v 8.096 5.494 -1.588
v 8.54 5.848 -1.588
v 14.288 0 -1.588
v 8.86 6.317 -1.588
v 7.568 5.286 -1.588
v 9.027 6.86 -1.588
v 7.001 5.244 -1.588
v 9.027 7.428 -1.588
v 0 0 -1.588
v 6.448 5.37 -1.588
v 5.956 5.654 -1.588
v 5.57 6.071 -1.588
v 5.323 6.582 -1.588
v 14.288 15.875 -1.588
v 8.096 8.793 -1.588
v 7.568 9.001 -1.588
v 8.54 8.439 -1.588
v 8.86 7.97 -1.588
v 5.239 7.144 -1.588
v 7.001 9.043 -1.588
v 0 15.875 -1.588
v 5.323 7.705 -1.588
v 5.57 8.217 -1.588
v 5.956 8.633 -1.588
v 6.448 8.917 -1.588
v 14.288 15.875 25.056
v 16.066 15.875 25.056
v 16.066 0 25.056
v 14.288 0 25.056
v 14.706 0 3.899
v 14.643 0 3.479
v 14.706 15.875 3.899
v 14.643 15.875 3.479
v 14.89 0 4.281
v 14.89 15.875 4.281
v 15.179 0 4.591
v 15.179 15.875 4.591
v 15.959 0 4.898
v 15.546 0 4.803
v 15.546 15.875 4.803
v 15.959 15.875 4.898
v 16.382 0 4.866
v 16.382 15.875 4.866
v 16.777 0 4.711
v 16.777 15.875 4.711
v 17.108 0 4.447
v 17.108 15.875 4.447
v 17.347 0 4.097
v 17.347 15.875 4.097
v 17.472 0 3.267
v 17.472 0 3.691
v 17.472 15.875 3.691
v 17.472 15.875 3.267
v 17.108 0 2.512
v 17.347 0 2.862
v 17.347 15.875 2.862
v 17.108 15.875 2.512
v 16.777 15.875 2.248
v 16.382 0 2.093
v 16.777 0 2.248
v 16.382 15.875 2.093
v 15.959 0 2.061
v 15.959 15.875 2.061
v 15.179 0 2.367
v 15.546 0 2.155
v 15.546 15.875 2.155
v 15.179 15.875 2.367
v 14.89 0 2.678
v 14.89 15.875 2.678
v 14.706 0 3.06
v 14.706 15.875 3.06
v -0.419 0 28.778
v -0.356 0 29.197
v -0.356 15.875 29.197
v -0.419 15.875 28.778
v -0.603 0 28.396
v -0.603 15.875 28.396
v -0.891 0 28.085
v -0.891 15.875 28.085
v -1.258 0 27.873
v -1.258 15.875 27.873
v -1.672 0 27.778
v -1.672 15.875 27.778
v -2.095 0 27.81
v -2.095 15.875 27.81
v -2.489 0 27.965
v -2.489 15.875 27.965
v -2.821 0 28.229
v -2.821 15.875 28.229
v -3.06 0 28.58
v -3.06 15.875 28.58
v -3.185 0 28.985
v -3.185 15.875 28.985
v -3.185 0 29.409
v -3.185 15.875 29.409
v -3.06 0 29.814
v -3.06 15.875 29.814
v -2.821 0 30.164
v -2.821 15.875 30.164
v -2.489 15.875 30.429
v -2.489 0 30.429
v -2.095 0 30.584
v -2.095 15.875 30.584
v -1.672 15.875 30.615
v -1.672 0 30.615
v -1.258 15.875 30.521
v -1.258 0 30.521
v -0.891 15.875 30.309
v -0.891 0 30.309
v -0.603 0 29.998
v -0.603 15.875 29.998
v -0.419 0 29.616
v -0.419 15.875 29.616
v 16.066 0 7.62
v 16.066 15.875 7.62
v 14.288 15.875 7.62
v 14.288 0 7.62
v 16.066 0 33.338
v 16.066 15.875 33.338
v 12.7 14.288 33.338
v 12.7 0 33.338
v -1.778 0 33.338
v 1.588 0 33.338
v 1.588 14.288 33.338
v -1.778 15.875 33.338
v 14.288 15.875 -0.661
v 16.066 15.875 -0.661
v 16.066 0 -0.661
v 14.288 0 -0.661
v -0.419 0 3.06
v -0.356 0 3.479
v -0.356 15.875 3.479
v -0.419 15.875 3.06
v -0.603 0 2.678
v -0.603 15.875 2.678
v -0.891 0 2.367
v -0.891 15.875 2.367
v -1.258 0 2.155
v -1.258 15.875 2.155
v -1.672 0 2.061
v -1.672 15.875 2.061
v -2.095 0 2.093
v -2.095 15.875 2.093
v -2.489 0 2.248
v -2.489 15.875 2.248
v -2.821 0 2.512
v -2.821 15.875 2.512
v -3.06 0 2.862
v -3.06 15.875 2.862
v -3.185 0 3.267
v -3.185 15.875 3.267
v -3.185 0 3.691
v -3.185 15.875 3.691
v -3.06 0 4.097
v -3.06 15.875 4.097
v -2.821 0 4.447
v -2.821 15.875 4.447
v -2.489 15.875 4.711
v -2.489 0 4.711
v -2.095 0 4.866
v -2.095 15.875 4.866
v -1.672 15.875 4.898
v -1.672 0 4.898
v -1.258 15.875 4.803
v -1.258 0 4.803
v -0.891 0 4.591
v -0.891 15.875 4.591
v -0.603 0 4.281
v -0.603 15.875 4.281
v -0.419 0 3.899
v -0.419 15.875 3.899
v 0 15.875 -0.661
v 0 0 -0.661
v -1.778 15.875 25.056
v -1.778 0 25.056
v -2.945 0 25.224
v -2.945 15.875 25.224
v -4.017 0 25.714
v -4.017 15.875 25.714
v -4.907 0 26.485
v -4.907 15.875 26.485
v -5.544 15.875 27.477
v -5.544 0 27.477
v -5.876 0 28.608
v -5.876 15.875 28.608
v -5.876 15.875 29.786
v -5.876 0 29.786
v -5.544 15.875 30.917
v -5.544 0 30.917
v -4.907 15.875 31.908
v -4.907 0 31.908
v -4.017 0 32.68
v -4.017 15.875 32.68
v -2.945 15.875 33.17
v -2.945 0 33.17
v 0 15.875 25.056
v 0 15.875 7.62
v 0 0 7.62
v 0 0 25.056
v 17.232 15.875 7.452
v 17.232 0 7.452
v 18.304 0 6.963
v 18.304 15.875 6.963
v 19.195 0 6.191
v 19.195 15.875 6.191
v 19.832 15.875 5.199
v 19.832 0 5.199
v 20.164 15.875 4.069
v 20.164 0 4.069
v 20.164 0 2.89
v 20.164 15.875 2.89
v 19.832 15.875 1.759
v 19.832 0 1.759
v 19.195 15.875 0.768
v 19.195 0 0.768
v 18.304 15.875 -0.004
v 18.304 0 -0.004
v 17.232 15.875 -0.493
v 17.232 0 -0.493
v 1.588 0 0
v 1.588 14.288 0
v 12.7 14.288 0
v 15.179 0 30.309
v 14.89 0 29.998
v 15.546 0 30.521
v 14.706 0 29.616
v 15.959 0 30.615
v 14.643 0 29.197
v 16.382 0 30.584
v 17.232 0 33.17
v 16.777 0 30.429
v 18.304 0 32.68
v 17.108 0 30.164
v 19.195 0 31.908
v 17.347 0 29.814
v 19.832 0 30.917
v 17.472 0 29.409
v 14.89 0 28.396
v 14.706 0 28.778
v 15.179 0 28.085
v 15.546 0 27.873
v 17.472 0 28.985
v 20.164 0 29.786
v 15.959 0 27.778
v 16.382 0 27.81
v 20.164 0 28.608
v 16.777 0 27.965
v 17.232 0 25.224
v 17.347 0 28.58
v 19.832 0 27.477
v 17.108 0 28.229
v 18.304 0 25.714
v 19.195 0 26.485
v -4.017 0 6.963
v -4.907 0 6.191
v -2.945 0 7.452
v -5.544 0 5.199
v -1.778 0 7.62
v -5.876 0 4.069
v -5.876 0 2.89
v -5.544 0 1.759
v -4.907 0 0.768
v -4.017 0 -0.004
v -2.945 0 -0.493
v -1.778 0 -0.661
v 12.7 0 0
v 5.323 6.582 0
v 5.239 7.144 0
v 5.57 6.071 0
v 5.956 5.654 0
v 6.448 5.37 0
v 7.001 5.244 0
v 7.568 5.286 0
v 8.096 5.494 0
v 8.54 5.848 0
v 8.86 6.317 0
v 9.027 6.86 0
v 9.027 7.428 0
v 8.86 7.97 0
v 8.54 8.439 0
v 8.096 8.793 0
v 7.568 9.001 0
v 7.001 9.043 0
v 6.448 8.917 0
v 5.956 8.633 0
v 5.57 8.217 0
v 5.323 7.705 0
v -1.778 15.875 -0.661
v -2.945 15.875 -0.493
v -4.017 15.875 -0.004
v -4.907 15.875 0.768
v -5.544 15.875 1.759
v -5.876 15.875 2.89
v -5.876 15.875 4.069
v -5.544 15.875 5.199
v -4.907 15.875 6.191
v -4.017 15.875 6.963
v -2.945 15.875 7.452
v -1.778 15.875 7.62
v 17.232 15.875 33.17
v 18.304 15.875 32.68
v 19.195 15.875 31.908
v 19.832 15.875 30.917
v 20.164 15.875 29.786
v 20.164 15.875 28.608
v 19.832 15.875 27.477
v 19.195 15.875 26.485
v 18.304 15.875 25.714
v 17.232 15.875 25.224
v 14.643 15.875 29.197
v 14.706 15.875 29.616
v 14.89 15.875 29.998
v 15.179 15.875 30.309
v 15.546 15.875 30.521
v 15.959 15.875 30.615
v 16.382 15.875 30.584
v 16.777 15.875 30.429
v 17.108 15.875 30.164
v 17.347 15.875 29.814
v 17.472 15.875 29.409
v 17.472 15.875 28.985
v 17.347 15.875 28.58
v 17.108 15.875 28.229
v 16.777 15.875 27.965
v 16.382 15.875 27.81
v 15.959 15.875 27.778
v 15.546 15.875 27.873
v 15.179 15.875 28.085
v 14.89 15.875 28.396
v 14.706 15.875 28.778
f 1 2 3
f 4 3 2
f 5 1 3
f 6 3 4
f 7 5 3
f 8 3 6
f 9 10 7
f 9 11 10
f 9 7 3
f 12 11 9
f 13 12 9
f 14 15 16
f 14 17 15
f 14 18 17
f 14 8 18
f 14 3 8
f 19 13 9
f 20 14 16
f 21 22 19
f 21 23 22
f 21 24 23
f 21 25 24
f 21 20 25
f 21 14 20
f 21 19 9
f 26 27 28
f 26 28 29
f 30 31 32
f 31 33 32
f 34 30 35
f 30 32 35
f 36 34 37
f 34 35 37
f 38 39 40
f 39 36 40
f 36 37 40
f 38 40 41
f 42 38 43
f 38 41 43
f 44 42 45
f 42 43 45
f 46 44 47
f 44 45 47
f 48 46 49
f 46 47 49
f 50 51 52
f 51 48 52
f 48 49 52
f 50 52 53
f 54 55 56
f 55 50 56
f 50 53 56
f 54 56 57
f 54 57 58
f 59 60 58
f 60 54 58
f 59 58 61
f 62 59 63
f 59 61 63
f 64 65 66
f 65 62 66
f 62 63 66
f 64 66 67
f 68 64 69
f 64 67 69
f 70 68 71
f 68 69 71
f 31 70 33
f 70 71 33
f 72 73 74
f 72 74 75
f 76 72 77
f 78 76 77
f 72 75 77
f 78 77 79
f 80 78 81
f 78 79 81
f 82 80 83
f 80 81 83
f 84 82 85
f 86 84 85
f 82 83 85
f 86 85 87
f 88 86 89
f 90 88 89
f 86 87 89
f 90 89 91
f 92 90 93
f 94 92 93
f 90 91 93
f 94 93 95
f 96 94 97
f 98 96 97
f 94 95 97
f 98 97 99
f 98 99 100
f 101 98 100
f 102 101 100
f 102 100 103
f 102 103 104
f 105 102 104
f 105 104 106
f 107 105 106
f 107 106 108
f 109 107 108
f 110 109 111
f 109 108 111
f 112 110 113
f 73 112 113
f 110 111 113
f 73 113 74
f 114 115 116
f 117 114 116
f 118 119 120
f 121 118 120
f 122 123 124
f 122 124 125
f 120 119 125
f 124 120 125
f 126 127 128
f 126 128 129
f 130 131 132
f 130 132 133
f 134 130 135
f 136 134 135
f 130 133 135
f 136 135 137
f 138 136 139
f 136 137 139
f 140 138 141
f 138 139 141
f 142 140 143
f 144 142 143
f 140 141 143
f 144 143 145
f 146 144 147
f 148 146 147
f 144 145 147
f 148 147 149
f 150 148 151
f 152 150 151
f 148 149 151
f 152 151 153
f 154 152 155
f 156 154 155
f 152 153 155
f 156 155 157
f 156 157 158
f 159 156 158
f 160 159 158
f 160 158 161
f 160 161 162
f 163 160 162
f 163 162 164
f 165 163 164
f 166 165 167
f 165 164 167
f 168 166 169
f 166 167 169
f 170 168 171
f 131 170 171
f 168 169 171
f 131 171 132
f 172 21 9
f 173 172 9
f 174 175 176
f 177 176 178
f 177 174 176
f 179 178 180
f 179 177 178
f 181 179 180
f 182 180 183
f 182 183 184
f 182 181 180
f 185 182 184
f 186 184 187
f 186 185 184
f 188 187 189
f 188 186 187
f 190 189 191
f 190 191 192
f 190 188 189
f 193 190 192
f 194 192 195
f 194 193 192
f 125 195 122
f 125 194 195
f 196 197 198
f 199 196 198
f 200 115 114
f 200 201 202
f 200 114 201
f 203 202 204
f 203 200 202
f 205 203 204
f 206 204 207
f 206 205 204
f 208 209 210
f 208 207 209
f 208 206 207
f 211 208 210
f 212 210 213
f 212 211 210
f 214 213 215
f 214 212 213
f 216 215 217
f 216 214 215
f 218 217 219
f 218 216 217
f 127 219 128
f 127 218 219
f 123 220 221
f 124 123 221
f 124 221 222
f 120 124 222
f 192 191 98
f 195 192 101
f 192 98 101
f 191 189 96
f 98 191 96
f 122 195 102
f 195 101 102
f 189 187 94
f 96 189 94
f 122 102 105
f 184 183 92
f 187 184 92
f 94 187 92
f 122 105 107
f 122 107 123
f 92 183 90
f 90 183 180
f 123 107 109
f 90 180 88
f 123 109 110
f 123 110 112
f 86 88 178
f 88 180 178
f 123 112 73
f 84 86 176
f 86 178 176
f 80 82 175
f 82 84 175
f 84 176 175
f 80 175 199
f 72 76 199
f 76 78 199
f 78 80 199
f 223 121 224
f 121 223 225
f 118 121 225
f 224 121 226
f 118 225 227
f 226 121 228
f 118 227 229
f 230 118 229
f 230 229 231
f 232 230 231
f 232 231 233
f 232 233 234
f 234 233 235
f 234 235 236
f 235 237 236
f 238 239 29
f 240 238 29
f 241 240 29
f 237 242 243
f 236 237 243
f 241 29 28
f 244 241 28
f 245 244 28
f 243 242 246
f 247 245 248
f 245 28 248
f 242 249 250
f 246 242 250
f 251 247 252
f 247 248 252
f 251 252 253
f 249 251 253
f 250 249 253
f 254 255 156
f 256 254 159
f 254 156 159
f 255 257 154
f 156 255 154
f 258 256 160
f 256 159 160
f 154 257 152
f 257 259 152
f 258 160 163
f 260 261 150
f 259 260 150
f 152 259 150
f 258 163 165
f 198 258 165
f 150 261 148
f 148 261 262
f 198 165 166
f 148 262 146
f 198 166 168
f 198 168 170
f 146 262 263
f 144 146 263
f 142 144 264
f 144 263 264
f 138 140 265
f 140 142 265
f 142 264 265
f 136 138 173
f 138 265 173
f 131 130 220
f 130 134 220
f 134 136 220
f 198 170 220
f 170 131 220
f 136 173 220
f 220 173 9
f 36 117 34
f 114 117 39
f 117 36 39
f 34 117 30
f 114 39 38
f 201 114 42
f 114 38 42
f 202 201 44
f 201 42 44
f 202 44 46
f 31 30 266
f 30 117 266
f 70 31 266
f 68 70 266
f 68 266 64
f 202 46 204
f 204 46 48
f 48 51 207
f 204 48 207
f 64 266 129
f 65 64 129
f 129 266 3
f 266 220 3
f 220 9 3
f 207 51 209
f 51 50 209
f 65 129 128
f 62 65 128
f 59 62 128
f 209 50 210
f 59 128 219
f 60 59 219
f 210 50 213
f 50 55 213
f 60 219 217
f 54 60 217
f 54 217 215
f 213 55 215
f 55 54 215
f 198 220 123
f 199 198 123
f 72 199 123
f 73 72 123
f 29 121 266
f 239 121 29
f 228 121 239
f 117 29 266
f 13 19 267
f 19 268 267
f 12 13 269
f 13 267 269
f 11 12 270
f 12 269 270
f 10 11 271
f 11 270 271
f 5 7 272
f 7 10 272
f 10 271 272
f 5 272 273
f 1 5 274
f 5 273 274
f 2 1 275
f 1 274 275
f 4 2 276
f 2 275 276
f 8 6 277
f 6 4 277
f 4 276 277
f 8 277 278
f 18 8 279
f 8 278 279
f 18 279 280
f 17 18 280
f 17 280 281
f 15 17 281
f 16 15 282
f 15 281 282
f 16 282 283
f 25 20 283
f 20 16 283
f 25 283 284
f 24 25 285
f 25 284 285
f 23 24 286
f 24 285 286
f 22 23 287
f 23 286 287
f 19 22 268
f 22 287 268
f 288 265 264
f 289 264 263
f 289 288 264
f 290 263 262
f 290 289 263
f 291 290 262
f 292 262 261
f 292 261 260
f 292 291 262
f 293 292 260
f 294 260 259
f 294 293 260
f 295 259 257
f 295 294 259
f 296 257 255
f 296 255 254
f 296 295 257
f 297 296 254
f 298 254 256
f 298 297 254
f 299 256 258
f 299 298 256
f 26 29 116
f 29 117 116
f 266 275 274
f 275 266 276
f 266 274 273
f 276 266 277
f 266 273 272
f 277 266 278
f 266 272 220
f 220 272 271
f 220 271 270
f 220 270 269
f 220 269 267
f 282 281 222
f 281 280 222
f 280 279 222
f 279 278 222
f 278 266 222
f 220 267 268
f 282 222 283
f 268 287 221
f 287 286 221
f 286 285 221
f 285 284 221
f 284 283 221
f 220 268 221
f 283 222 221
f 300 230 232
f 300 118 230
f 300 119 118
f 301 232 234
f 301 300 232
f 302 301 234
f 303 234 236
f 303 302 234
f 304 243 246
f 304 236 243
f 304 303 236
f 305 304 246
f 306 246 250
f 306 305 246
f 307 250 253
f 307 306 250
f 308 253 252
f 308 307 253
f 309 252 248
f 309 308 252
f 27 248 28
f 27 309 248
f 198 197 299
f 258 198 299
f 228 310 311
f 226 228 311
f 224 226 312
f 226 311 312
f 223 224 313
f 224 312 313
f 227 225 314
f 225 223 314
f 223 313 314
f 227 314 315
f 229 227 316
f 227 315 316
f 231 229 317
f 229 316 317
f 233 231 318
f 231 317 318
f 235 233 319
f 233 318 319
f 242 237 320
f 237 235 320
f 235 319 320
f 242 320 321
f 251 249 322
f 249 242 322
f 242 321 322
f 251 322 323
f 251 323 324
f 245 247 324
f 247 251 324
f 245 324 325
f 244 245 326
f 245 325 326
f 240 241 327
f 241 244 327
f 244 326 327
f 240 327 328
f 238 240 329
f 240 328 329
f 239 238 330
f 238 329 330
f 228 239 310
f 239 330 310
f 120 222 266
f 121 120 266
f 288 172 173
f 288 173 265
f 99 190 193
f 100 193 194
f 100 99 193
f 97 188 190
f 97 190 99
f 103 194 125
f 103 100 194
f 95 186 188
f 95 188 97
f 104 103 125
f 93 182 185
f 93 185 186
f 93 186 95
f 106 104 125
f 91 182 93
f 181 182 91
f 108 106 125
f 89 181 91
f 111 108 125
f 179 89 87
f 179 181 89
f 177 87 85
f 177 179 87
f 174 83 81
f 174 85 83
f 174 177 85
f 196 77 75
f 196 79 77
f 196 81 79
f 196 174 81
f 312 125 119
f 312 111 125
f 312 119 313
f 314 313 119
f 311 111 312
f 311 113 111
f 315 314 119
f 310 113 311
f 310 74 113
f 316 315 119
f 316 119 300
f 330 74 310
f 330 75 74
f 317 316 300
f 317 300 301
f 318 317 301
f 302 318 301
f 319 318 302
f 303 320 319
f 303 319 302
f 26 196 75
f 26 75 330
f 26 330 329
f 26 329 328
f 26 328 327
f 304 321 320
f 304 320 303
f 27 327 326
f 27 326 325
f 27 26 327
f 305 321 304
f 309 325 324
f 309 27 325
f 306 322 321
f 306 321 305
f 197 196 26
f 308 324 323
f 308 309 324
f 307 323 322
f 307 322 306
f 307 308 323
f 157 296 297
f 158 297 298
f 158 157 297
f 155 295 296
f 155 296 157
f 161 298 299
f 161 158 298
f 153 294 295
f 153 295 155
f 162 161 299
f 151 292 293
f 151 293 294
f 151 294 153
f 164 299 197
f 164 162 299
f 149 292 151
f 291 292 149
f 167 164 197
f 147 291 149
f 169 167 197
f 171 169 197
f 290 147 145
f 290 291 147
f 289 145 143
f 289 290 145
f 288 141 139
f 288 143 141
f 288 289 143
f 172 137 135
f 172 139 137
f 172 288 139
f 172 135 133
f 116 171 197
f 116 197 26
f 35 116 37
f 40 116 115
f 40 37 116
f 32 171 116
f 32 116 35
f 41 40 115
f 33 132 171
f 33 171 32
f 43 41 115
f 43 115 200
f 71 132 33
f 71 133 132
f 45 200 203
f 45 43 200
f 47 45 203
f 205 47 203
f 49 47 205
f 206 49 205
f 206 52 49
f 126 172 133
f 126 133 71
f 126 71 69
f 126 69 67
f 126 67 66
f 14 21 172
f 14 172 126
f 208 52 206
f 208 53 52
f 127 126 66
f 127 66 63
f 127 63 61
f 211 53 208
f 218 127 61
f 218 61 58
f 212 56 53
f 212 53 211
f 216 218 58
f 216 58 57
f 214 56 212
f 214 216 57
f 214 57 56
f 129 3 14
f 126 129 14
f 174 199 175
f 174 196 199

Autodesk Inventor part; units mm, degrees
ref_plane "YZ Plane" through (0, 0, 0) normal (1, 0, 0) x (0, 1, 0)
ref_plane "XZ Plane" through (0, 0, 0) normal (0, 1, 0) x (-1, 0, 0)
sketch "Sketch1" plane through (0, 0, 0) normal (0, 0, 1) x (1, 0, 0)
  line L0 (0, 0) -> (1.5875, 0)
  line L1 (1.5875, 0) -> (1.5875, 14.2875)
  line L2 (1.5875, 14.2875) -> (12.7, 14.2875)
  line L3 (12.7, 14.2875) -> (12.7, 0)
  line L4 (12.7, 0) -> (14.2875, 0)
  line L5 (14.2875, 0) -> (14.2875, 15.875)
  line L6 (14.2875, 15.875) -> (0, 15.875)
  line L7 (0, 15.875) -> (0, 0)
  dimension "d1" = 11.1125
  dimension "wallThickness" = 1.5875
  dimension "d4" = 1.5875
  dimension "d5" = 1.5875
  dimension "d6" = 14.2875
  dimension "outerWidth" = 14.2875
extrude "Extrusion1" add sketch "Sketch1" along normal blind 33.3375
sketch "Sketch2" plane through (0, 0, 0) normal (0, 0, -1) x (-1, 0, 0)
  line L0 (0, 15.875) -> (0, 0) projected
  line L1 (-14.2875, 15.875) -> (0, 15.875) projected
  line L2 (-14.2875, 0) -> (-14.2875, 15.875) projected
  line L3 (-14.2875, 0) -> (0, 0)
  line L4 (-12.7, 14.2875) -> (-12.7, 0) projected
  circle A0 centre (-7.1437, 7.1437) radius 1.905
  dimension "d11" = 3.81
  dimension "d12" = 7.1437
  dimension "d13" = 5.5563
extrude "Extrusion3" add sketch "Sketch2" along normal blind 1.5875
sketch "Sketch3" plane through (0, 15.875, 33.3375) normal (0, 1, 0) x (1, 0, 0)
  line L0 (0, 34.925) -> (0, 0) projected
  circle A0 centre (-1.778, 4.1406) radius 1.4224
  line L1 (0, 0) -> (-1.778, 0)
  line L2 (0, 8.2812) -> (-1.778, 8.2812)
  arc A1 (-1.778, 8.2812) -> (-1.778, 0) centre (-1.778, 4.1406) ccw
  line L3 (0, 0) -> (14.2875, 0) projected
  point P0 (0, 33.3375)
  dimension "screwOuterDiameter" = 8.2812
  dimension "d24" = 4.1406
  dimension "d25" = 0
  dimension "screwHoleOffsetFromSide" = 1.778
  dimension "screwHoleDiameter" = 2.8448
extrude "Extrusion4" add sketch "Sketch3" against normal blind 15.875
pattern_linear "Rectangular Pattern1" count 2 spacing 25.7175 along (0, 0, -1) of "Extrusion4"
ref_plane "Work Plane1" through (7.1438, 0, 33.3375) normal (-1, 0, 0) x (0, 0, -1)
mirror "Mirror1" about plane through (7.1438, 0, 33.3375) normal (-1, 0, 0) of "Extrusion4", "Rectangular Pattern1"
equation "\"d1\" = plungerWidth + plungerTolerance"
equation "\"d4\" = wallThickness"
equation "\"d5\" = wallThickness"
equation "\"d6\" = plungerHeight + plungerTolerance"
equation "\"outerLength\" = plungerLength + springLength"
equation "\"d12\" = 0.5 * d6"
equation "\"d13\" = 0.5 * d1"
equation "\"d14\" = wallThickness"
equation "\"d24\" = 0.5 * screwOuterDiameter"
equation "\"d28\" = wallThickness + plungerHeight + plungerTolerance"
equation "\"plungerWidth\" = 9.525"
equation "\"plungerTolerance\" = 1.5875"
equation "\"plungerHeight\" = 12.7"
equation "\"plungerLength\" = 12.7"
equation "\"springLength\" = 20.6375"
properties part number "BatteryLatch-Outer"
